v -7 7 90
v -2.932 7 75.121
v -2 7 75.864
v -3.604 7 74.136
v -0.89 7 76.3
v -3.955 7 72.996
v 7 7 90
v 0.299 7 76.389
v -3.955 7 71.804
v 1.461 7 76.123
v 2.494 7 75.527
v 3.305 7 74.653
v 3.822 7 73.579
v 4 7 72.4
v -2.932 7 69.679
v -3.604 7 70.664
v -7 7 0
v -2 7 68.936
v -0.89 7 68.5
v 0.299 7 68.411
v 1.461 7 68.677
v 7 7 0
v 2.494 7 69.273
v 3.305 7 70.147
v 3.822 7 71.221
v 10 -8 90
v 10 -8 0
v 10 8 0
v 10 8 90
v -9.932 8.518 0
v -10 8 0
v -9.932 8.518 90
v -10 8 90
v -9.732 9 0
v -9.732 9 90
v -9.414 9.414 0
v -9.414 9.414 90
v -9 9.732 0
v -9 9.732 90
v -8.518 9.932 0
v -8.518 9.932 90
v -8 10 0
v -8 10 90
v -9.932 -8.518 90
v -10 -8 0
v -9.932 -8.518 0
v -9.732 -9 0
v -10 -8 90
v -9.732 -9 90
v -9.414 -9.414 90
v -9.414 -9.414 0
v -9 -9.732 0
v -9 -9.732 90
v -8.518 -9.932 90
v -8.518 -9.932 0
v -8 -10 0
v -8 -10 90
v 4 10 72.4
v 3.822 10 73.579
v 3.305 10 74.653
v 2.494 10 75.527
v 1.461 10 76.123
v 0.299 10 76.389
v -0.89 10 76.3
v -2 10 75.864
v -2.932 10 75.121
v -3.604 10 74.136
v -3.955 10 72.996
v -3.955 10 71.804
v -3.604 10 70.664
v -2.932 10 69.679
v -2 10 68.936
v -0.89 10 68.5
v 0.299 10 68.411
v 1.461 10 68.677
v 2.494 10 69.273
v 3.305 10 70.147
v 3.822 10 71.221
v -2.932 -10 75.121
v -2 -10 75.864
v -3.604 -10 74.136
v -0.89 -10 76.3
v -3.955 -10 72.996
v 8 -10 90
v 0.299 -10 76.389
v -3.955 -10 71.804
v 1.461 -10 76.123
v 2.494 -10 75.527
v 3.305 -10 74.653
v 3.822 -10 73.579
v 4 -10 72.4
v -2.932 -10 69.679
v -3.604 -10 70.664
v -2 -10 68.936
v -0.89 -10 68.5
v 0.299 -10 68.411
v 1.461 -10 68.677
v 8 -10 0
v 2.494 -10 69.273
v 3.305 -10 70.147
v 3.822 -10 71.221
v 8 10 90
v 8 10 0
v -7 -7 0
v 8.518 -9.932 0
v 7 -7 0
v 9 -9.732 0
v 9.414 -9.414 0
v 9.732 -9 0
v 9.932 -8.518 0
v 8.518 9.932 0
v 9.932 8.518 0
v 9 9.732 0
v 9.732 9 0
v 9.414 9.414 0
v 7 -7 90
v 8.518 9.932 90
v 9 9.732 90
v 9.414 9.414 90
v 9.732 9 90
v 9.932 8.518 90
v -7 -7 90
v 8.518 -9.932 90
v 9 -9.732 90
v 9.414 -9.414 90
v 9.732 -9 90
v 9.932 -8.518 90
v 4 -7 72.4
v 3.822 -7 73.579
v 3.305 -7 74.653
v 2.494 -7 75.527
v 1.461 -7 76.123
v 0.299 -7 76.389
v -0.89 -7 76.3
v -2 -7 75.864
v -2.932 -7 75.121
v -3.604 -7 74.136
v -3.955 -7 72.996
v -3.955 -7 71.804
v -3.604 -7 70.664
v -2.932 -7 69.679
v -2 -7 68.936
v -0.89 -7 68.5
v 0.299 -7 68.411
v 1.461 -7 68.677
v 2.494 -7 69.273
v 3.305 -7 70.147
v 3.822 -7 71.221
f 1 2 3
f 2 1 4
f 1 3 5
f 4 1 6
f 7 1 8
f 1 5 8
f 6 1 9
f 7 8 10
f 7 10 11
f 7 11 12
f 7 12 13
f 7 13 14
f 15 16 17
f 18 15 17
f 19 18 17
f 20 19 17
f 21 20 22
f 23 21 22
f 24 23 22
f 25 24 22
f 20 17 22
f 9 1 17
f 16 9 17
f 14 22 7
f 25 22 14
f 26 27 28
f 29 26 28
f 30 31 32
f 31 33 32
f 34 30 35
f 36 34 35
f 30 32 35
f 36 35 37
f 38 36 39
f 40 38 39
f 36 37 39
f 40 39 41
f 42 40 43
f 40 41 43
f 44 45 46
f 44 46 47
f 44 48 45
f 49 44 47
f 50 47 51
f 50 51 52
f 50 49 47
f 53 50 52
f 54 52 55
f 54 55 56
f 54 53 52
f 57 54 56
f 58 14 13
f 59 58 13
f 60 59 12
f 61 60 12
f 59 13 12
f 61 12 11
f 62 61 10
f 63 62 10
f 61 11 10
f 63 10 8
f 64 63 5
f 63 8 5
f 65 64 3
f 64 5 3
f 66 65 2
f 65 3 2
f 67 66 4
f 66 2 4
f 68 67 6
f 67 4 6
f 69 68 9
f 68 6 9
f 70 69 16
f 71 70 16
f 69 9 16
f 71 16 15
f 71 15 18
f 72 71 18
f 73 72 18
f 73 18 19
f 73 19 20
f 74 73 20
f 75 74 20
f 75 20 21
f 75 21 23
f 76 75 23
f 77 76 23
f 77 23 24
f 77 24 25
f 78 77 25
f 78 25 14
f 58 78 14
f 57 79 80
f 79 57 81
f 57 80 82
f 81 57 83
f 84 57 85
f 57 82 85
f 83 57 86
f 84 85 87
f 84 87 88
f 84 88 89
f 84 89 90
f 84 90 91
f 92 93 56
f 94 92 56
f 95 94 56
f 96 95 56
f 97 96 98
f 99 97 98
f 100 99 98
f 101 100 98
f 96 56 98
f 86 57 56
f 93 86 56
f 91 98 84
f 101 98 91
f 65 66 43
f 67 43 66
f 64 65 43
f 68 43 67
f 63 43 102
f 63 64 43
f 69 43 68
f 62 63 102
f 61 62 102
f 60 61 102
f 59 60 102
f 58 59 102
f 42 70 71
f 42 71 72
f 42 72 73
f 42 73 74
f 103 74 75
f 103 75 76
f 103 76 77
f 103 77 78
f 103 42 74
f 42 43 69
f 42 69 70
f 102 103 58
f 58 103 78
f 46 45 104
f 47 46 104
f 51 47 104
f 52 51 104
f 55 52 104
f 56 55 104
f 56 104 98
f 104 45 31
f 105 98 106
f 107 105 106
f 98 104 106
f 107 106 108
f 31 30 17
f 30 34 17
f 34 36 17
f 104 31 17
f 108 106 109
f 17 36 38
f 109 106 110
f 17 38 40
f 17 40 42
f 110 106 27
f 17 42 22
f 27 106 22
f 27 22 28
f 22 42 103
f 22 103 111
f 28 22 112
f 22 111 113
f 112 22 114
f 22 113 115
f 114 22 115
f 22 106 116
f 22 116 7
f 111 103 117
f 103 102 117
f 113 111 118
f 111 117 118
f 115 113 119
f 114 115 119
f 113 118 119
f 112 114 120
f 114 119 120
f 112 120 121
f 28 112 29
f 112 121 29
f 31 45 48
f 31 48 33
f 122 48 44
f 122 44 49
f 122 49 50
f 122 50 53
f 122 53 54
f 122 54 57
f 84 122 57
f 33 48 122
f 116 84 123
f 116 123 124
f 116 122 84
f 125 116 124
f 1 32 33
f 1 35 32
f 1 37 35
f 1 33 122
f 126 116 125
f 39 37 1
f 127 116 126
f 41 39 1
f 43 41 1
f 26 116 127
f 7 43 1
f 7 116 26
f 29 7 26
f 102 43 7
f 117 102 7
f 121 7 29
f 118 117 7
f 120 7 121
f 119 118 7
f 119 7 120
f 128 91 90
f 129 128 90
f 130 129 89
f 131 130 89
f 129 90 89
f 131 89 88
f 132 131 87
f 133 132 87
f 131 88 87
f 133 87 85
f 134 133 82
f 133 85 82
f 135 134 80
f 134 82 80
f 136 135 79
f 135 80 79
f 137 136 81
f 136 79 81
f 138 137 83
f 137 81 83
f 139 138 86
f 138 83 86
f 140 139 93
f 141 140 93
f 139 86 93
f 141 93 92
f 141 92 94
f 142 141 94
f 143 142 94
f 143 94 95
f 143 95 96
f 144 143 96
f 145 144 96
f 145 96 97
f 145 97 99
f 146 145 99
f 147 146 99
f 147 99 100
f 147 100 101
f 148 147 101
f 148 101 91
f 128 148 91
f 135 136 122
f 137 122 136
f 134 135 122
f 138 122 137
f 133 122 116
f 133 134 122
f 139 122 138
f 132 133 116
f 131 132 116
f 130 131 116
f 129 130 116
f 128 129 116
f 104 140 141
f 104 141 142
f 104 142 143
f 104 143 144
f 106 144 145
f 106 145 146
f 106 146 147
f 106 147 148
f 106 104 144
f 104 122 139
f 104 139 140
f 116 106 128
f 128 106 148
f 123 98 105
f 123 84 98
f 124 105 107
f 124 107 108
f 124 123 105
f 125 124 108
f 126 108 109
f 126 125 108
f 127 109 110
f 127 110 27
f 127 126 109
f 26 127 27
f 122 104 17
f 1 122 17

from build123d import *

# Parameters (mm, degrees)
F0_W     = 20
F0_H     = 20
F0_W_2   = 14
F0_H_2   = 14
F1_DEPTH = 90
F2_R     = 2
F4_D     = 8


with BuildPart() as f1:
    # F0 (on Top) → F1 (new body)
    with BuildSketch(Plane.XY):
        Rectangle(F0_W, F0_H)
        Rectangle(F0_W_2, F0_H_2, mode=Mode.SUBTRACT)
    extrude(amount=F1_DEPTH)

    # F2
    f2_edges = [f1.edges().sort_by_distance(p)[0] for p in [
        (10, -10, 45),
        (10, 10, 45),
        (-10, -10, 45),
        (-10, 10, 45),
    ]]
    fillet(f2_edges, radius=F2_R)

    # F4 (through all)
    with Locations(Plane(origin=(0, 10, 0), x_dir=(-1, 0, 0), z_dir=(0, 1, 0))):
        with Locations((0, 72.4)):
            Hole(F4_D / 2)


solid = f1.part
